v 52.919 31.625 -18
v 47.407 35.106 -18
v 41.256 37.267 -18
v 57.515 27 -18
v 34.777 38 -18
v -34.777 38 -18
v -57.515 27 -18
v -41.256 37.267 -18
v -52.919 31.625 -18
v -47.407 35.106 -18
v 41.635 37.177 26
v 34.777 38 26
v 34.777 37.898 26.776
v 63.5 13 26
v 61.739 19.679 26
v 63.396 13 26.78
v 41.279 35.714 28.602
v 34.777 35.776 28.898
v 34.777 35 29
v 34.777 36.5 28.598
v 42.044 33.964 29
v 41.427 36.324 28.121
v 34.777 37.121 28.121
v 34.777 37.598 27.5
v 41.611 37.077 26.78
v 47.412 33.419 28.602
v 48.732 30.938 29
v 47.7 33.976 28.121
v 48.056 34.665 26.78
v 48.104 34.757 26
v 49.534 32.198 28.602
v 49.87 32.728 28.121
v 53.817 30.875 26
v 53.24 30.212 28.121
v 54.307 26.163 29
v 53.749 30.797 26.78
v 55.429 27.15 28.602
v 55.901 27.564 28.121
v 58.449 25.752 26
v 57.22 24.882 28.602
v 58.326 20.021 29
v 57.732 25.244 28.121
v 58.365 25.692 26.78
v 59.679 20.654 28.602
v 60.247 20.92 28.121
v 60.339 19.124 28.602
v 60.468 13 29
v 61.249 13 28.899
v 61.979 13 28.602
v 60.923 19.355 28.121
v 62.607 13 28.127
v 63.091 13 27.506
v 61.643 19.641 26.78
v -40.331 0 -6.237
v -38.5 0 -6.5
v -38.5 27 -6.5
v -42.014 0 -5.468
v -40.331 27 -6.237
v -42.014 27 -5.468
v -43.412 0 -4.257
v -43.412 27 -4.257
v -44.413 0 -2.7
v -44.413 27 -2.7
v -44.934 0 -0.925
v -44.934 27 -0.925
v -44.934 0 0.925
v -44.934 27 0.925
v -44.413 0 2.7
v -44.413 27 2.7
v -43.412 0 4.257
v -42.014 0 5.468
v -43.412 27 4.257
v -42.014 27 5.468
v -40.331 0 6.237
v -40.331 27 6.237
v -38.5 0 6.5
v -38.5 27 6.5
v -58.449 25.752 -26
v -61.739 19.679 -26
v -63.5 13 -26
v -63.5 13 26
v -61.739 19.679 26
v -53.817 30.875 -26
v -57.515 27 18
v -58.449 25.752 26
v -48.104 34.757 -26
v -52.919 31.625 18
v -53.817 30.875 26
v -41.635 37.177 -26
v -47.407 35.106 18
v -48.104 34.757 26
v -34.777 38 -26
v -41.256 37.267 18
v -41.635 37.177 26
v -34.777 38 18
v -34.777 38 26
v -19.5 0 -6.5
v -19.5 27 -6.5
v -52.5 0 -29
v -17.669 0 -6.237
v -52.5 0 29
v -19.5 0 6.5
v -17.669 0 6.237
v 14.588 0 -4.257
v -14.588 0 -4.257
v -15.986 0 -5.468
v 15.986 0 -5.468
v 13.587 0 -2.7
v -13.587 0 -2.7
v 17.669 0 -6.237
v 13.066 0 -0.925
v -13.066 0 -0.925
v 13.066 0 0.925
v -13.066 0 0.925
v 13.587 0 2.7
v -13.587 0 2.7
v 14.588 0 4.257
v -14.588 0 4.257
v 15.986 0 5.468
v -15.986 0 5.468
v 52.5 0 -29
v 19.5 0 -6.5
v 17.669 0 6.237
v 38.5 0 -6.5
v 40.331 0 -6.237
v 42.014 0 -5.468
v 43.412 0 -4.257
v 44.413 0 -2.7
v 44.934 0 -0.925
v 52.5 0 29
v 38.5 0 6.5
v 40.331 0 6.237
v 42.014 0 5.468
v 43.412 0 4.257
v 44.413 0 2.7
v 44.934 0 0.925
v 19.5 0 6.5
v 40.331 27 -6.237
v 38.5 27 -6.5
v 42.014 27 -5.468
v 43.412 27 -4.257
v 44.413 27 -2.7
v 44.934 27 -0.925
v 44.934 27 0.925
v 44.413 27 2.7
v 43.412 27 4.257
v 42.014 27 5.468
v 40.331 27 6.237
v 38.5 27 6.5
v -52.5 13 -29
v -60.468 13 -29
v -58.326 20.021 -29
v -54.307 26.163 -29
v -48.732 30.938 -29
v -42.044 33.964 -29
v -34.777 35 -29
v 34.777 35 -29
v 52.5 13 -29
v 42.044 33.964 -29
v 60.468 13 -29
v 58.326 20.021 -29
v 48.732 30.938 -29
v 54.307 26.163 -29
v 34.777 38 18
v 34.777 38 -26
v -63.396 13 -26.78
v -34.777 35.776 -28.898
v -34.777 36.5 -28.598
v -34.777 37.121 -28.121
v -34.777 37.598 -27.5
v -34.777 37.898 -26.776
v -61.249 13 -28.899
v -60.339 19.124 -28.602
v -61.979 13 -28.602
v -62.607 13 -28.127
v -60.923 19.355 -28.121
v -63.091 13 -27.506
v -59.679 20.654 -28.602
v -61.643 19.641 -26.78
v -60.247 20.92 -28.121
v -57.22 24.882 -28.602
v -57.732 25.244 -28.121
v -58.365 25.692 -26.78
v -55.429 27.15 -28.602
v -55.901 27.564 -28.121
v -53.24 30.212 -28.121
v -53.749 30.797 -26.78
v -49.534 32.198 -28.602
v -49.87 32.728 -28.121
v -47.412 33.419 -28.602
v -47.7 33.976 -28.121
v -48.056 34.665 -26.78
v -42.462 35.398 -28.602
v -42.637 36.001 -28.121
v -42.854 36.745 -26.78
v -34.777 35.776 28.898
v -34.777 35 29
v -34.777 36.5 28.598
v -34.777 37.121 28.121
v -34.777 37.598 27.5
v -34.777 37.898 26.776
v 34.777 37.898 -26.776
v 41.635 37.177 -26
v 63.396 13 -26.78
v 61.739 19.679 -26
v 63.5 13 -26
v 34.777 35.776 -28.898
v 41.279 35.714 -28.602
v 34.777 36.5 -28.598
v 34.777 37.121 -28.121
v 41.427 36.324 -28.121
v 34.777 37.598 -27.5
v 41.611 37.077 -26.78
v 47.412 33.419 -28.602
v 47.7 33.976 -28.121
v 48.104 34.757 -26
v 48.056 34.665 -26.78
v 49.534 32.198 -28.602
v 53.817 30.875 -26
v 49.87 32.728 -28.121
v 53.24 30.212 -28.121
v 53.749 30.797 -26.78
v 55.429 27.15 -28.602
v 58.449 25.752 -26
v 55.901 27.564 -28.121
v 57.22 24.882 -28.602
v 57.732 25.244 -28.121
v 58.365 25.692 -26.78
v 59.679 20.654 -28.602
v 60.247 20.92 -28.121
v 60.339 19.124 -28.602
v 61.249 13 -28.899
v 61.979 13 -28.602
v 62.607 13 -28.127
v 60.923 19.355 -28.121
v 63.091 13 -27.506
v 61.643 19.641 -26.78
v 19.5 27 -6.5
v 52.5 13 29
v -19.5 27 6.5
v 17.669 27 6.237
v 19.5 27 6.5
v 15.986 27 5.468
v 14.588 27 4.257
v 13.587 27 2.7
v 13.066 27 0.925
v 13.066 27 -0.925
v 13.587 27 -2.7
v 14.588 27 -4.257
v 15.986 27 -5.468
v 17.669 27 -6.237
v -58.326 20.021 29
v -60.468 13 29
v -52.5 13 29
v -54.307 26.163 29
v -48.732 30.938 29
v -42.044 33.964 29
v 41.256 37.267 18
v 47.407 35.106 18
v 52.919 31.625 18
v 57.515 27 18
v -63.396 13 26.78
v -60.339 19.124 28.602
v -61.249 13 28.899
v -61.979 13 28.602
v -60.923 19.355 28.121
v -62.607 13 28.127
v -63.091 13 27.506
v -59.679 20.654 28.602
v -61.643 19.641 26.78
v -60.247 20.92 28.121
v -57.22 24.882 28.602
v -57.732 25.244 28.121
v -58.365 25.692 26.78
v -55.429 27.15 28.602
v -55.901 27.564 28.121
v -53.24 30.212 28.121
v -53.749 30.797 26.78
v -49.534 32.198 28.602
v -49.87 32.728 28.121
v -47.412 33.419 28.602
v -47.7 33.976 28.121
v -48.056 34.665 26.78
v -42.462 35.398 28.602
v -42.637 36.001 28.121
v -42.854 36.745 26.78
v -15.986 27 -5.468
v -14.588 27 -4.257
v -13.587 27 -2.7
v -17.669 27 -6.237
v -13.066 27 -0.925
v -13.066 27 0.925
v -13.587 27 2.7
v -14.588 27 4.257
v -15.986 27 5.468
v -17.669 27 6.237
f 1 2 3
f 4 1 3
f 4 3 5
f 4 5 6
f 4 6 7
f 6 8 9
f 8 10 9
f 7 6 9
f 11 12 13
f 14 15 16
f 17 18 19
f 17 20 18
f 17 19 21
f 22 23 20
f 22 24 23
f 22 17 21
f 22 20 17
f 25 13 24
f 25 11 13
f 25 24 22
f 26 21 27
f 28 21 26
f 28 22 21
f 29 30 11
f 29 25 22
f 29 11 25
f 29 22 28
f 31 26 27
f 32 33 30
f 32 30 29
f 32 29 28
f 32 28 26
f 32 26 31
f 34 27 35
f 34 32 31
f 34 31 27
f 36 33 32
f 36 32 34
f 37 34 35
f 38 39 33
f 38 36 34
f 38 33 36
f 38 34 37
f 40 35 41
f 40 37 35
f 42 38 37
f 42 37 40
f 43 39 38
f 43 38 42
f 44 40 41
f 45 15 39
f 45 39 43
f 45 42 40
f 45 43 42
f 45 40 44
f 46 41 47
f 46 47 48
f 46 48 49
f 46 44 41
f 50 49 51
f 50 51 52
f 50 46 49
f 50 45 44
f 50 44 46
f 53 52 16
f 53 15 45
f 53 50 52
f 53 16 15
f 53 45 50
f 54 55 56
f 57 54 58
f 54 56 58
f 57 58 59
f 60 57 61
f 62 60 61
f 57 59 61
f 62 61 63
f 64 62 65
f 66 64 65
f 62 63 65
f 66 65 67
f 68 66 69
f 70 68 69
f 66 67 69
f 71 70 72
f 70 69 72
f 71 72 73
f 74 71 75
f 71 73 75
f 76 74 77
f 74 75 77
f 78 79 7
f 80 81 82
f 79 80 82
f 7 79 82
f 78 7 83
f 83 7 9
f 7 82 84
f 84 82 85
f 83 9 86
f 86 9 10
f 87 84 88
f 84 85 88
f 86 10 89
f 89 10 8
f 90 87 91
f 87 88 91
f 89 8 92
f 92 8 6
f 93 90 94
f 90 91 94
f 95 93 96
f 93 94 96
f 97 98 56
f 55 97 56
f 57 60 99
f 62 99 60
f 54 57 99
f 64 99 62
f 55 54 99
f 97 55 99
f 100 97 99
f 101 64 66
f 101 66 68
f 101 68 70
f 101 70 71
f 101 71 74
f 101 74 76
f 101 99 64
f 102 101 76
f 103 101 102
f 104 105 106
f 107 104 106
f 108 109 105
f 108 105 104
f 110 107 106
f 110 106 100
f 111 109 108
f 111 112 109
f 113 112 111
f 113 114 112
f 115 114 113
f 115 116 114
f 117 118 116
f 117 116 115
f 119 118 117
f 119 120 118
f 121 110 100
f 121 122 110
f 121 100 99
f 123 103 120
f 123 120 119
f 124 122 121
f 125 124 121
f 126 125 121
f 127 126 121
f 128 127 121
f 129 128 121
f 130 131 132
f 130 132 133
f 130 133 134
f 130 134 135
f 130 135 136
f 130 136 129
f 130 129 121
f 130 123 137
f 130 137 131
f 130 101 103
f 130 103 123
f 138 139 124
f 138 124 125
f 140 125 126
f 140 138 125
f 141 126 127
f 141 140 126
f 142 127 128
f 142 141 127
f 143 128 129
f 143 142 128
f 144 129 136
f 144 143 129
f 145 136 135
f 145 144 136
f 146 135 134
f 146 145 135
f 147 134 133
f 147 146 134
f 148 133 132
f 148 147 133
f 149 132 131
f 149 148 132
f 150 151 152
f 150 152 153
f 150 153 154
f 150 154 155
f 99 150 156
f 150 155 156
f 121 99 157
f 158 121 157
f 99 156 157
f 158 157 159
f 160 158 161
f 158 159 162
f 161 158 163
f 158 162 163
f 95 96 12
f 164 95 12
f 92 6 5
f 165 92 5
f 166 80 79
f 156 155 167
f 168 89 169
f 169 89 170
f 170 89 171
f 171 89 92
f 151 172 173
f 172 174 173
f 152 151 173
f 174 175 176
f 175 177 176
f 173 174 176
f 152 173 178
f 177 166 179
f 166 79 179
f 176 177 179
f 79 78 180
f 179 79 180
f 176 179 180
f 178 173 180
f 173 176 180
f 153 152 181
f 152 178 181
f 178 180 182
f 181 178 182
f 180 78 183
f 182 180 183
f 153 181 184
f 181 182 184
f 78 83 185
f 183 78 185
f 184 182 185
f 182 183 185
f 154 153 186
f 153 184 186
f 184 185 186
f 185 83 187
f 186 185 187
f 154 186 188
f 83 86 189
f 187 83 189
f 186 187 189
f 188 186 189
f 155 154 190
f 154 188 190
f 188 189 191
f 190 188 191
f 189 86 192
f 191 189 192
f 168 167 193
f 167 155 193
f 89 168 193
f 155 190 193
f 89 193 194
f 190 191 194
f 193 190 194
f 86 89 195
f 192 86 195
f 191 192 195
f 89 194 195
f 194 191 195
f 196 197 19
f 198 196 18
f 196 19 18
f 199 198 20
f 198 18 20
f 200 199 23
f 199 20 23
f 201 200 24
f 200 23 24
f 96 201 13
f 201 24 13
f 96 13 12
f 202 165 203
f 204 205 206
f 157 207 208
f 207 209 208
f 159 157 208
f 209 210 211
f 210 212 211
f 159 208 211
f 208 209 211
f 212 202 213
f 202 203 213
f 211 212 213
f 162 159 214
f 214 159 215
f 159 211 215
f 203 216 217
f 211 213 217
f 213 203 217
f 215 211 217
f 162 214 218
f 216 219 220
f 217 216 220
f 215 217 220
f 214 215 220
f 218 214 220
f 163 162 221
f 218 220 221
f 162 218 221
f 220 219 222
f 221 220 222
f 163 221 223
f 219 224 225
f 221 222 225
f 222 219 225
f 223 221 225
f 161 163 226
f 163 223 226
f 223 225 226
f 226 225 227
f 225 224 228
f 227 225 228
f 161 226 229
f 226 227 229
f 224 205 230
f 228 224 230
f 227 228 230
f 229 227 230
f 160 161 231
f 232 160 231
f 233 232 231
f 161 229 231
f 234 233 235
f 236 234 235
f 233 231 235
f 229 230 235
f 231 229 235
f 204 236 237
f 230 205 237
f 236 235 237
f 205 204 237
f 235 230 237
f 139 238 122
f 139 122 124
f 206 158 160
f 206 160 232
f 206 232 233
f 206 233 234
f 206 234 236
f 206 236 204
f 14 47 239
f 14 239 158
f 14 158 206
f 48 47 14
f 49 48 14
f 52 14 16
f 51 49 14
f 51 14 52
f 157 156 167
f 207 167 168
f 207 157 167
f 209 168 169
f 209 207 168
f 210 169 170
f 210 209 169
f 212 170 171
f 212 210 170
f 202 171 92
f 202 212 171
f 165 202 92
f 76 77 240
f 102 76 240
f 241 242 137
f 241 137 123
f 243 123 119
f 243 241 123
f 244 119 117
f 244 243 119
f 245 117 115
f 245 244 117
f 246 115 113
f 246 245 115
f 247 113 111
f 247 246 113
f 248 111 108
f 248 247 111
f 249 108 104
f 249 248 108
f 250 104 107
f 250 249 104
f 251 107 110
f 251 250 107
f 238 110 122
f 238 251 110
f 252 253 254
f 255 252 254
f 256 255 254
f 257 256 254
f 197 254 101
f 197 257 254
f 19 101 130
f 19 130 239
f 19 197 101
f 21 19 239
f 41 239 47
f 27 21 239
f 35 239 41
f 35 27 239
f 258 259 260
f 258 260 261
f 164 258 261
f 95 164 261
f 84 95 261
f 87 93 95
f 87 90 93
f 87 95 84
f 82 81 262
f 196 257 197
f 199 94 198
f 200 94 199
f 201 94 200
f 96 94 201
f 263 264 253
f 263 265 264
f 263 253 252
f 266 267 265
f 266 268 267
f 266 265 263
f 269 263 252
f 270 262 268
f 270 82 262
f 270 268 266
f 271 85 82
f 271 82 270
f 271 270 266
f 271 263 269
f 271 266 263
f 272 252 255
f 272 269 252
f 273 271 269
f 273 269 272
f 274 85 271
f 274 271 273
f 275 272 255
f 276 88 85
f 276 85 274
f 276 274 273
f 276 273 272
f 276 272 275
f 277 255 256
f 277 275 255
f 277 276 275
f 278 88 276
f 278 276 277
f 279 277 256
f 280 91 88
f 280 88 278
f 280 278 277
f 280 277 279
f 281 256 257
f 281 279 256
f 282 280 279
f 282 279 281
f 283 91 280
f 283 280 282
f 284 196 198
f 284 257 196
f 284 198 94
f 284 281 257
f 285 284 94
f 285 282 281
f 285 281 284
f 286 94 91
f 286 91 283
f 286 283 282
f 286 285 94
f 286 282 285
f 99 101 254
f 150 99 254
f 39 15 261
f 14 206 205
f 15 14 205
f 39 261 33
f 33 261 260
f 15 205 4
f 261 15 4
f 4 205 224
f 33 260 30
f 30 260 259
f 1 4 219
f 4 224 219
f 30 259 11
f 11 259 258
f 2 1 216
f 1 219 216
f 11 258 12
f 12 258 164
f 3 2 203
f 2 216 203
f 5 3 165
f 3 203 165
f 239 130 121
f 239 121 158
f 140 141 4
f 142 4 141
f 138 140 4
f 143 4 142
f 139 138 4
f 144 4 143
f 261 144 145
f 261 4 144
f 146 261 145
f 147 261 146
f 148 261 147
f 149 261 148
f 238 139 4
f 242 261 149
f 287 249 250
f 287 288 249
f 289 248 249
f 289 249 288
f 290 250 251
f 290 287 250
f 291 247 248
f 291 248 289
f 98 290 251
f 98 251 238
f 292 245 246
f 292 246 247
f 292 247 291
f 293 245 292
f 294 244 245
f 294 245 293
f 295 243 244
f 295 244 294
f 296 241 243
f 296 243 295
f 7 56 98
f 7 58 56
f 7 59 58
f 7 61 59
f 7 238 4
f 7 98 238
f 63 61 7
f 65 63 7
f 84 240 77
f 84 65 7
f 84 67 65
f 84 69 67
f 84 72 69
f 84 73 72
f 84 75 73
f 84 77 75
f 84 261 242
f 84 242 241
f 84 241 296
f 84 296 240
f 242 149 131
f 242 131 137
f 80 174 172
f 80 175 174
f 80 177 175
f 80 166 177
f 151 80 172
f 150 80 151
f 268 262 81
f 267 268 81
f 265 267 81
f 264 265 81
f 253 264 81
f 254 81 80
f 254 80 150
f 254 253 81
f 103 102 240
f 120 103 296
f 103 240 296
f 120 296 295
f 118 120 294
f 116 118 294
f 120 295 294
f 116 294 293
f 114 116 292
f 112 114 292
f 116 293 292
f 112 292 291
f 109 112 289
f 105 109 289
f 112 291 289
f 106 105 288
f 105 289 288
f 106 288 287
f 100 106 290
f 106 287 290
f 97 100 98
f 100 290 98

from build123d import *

# Parameters (mm, degrees)
ESQUISSE1_W             = 127
ESQUISSE1_H             = 38
BASE_EXTRUSION_DEPTH    = 29
ESQUISSE2_W             = 11
ESQUISSE2_H             = 13
ENL_V_MAT_EXTRU_1_DEPTH = 95.022603665
CONG_1_R                = 29
ESQUISSE3_W             = 127
ESQUISSE3_H             = 36
ENL_V_MAT_EXTRU_2_DEPTH = 11
ENL_V_MAT_EXTRU_3_DEPTH = 75.848179671
CONG_2_R                = 3


with BuildPart() as part:
    # Esquisse1 → Base-Extrusion (new, symmetric)
    with BuildSketch(Plane.XY):
        with Locations((0, 19)):
            Rectangle(ESQUISSE1_W, ESQUISSE1_H)
    extrude(amount=BASE_EXTRUSION_DEPTH, both=True)

    # Esquisse2 → Enlèv. mat.-Extru.1 (cut, through all)
    with BuildSketch(Plane.XY.offset(29)):
        with Locations((-58, 6.5)):
            Rectangle(ESQUISSE2_W, ESQUISSE2_H)
        with Locations((58, 6.5)):
            Rectangle(ESQUISSE2_W, ESQUISSE2_H)
    extrude(amount=-ENL_V_MAT_EXTRU_1_DEPTH, mode=Mode.SUBTRACT)

    # Congé1
    # the kernel refuses this fillet: 29 mm, written as the material it takes off along each edge
    with BuildSketch(Plane(origin=(-63.5, 38, 100.807033082), x_dir=(0, -1, 0), z_dir=(0, 0, -1))) as cong_1_piece_1:
        with BuildLine():
            CenterArc((29, -28.722813233), CONG_1_R, 97.928141766, 82.071858234)
            Line((0, -28.722813233), (-0.58, -28.722813233))
            Line((-0.58, -28.722813233), (-0.58, 0))
            Line((-0.58, 0), (0, 0.58))
            ThreePointArc((0, 0.58), (12.5, 0.58), (24.92, 0.574456265))
            Line((24.92, 0.574456265), (25, 0))
        make_face()
    extrude(amount=201.614066163, mode=Mode.SUBTRACT)
    with BuildSketch(Plane(origin=(63.5, 38, -100.807033082), x_dir=(-1, 0, 0), z_dir=(0, 0, 1))) as cong_1_piece_2:
        with BuildLine():
            CenterArc((28.722813233, 29), CONG_1_R, 187.928141766, 82.071858234)
            Line((0, 25), (-0.574456265, 24.92))
            ThreePointArc((-0.574456265, 24.92), (-0.58, 12.5), (-0.58, 0))
            Line((-0.58, 0), (0, -0.58))
            Line((0, -0.58), (28.722813233, -0.58))
            Line((28.722813233, -0.58), (28.722813233, 0))
        make_face()
    extrude(amount=201.614066163, mode=Mode.SUBTRACT)

    # Esquisse3 → Enlèv. mat.-Extru.2 (cut)
    with BuildSketch(Plane(origin=(0, 38, 0), x_dir=(-1, 0, 0), z_dir=(0, 1, 0))):
        Rectangle(ESQUISSE3_W, ESQUISSE3_H)
    extrude(amount=-ENL_V_MAT_EXTRU_2_DEPTH, mode=Mode.SUBTRACT)

    # Esquisse4 → Enlèv. mat.-Extru.3 (cut, through all)
    with BuildSketch(Plane(origin=(0, 27, 0), x_dir=(-1, 0, 0), z_dir=(0, 1, 0))):
        with BuildLine():
            Line((19.5, -6.5), (38.5, -6.5))
            ThreePointArc((38.5, -6.5), (45, 0), (38.5, 6.5))
            Line((38.5, 6.5), (19.5, 6.5))
            ThreePointArc((19.5, 6.5), (13, 0), (19.5, -6.5))
        make_face()
    enl_v_mat_extru_3 = extrude(amount=-ENL_V_MAT_EXTRU_3_DEPTH, mode=Mode.SUBTRACT)

    # Symétrie1: Enlèv. mat.-Extru.3 across plane
    add(enl_v_mat_extru_3.mirror(Plane(origin=(0, 0, 0), x_dir=(0, 0, 1), z_dir=(1, 0, 0))), mode=Mode.SUBTRACT)

    # Congé2
    cong_2_edges = [part.edges().sort_by_distance(p)[0] for p in [
        (0, 38, -29),
        (53.816619532, 30.874642854, -29),
        (-53.816619532, 30.874642854, -29),
        (0, 38, 29),
        (53.816619532, 30.874642854, 29),
        (-53.816619532, 30.874642854, 29),
    ]]
    fillet(cong_2_edges, radius=CONG_2_R)


solid = part.part
